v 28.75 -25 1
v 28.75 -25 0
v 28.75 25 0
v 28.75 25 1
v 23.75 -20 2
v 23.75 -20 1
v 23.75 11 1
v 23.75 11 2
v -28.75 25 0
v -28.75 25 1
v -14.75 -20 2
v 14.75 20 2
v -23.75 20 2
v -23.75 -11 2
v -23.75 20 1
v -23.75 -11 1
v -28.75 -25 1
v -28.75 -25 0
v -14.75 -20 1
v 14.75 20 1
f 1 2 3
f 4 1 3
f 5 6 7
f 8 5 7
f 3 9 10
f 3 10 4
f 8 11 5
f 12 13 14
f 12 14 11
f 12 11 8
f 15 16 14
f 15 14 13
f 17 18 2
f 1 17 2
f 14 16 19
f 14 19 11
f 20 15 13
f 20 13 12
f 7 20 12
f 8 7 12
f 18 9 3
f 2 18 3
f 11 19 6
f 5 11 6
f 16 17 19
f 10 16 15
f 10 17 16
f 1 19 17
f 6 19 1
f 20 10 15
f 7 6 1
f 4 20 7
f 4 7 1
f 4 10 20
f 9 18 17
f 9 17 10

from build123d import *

# Parameters (mm, degrees)
F0_W     = 47.5
F0_H     = 40
F1_DEPTH = 2
F0_W_2   = 57.5
F0_H_2   = 50
F2_DEPTH = 1
F3_SIZE  = 9


with BuildPart() as f1:
    # F0 (on Top) → F1 (new body)
    with BuildSketch(Plane.XY):
        Rectangle(F0_W, F0_H)
    extrude(amount=F1_DEPTH)

    # F0 (on Top) → F2 (join)
    with BuildSketch(Plane.XY):
        Rectangle(F0_W_2, F0_H_2)
        Rectangle(F0_W, F0_H, mode=Mode.SUBTRACT)
    extrude(amount=F2_DEPTH)

    # F3
    f3_edges = [f1.edges().sort_by_distance(p)[0] for p in [
        (-23.75, -20, 1.5),
        (23.75, 20, 1.5),
    ]]
    chamfer(f3_edges, length=F3_SIZE)


solid = f1.part
